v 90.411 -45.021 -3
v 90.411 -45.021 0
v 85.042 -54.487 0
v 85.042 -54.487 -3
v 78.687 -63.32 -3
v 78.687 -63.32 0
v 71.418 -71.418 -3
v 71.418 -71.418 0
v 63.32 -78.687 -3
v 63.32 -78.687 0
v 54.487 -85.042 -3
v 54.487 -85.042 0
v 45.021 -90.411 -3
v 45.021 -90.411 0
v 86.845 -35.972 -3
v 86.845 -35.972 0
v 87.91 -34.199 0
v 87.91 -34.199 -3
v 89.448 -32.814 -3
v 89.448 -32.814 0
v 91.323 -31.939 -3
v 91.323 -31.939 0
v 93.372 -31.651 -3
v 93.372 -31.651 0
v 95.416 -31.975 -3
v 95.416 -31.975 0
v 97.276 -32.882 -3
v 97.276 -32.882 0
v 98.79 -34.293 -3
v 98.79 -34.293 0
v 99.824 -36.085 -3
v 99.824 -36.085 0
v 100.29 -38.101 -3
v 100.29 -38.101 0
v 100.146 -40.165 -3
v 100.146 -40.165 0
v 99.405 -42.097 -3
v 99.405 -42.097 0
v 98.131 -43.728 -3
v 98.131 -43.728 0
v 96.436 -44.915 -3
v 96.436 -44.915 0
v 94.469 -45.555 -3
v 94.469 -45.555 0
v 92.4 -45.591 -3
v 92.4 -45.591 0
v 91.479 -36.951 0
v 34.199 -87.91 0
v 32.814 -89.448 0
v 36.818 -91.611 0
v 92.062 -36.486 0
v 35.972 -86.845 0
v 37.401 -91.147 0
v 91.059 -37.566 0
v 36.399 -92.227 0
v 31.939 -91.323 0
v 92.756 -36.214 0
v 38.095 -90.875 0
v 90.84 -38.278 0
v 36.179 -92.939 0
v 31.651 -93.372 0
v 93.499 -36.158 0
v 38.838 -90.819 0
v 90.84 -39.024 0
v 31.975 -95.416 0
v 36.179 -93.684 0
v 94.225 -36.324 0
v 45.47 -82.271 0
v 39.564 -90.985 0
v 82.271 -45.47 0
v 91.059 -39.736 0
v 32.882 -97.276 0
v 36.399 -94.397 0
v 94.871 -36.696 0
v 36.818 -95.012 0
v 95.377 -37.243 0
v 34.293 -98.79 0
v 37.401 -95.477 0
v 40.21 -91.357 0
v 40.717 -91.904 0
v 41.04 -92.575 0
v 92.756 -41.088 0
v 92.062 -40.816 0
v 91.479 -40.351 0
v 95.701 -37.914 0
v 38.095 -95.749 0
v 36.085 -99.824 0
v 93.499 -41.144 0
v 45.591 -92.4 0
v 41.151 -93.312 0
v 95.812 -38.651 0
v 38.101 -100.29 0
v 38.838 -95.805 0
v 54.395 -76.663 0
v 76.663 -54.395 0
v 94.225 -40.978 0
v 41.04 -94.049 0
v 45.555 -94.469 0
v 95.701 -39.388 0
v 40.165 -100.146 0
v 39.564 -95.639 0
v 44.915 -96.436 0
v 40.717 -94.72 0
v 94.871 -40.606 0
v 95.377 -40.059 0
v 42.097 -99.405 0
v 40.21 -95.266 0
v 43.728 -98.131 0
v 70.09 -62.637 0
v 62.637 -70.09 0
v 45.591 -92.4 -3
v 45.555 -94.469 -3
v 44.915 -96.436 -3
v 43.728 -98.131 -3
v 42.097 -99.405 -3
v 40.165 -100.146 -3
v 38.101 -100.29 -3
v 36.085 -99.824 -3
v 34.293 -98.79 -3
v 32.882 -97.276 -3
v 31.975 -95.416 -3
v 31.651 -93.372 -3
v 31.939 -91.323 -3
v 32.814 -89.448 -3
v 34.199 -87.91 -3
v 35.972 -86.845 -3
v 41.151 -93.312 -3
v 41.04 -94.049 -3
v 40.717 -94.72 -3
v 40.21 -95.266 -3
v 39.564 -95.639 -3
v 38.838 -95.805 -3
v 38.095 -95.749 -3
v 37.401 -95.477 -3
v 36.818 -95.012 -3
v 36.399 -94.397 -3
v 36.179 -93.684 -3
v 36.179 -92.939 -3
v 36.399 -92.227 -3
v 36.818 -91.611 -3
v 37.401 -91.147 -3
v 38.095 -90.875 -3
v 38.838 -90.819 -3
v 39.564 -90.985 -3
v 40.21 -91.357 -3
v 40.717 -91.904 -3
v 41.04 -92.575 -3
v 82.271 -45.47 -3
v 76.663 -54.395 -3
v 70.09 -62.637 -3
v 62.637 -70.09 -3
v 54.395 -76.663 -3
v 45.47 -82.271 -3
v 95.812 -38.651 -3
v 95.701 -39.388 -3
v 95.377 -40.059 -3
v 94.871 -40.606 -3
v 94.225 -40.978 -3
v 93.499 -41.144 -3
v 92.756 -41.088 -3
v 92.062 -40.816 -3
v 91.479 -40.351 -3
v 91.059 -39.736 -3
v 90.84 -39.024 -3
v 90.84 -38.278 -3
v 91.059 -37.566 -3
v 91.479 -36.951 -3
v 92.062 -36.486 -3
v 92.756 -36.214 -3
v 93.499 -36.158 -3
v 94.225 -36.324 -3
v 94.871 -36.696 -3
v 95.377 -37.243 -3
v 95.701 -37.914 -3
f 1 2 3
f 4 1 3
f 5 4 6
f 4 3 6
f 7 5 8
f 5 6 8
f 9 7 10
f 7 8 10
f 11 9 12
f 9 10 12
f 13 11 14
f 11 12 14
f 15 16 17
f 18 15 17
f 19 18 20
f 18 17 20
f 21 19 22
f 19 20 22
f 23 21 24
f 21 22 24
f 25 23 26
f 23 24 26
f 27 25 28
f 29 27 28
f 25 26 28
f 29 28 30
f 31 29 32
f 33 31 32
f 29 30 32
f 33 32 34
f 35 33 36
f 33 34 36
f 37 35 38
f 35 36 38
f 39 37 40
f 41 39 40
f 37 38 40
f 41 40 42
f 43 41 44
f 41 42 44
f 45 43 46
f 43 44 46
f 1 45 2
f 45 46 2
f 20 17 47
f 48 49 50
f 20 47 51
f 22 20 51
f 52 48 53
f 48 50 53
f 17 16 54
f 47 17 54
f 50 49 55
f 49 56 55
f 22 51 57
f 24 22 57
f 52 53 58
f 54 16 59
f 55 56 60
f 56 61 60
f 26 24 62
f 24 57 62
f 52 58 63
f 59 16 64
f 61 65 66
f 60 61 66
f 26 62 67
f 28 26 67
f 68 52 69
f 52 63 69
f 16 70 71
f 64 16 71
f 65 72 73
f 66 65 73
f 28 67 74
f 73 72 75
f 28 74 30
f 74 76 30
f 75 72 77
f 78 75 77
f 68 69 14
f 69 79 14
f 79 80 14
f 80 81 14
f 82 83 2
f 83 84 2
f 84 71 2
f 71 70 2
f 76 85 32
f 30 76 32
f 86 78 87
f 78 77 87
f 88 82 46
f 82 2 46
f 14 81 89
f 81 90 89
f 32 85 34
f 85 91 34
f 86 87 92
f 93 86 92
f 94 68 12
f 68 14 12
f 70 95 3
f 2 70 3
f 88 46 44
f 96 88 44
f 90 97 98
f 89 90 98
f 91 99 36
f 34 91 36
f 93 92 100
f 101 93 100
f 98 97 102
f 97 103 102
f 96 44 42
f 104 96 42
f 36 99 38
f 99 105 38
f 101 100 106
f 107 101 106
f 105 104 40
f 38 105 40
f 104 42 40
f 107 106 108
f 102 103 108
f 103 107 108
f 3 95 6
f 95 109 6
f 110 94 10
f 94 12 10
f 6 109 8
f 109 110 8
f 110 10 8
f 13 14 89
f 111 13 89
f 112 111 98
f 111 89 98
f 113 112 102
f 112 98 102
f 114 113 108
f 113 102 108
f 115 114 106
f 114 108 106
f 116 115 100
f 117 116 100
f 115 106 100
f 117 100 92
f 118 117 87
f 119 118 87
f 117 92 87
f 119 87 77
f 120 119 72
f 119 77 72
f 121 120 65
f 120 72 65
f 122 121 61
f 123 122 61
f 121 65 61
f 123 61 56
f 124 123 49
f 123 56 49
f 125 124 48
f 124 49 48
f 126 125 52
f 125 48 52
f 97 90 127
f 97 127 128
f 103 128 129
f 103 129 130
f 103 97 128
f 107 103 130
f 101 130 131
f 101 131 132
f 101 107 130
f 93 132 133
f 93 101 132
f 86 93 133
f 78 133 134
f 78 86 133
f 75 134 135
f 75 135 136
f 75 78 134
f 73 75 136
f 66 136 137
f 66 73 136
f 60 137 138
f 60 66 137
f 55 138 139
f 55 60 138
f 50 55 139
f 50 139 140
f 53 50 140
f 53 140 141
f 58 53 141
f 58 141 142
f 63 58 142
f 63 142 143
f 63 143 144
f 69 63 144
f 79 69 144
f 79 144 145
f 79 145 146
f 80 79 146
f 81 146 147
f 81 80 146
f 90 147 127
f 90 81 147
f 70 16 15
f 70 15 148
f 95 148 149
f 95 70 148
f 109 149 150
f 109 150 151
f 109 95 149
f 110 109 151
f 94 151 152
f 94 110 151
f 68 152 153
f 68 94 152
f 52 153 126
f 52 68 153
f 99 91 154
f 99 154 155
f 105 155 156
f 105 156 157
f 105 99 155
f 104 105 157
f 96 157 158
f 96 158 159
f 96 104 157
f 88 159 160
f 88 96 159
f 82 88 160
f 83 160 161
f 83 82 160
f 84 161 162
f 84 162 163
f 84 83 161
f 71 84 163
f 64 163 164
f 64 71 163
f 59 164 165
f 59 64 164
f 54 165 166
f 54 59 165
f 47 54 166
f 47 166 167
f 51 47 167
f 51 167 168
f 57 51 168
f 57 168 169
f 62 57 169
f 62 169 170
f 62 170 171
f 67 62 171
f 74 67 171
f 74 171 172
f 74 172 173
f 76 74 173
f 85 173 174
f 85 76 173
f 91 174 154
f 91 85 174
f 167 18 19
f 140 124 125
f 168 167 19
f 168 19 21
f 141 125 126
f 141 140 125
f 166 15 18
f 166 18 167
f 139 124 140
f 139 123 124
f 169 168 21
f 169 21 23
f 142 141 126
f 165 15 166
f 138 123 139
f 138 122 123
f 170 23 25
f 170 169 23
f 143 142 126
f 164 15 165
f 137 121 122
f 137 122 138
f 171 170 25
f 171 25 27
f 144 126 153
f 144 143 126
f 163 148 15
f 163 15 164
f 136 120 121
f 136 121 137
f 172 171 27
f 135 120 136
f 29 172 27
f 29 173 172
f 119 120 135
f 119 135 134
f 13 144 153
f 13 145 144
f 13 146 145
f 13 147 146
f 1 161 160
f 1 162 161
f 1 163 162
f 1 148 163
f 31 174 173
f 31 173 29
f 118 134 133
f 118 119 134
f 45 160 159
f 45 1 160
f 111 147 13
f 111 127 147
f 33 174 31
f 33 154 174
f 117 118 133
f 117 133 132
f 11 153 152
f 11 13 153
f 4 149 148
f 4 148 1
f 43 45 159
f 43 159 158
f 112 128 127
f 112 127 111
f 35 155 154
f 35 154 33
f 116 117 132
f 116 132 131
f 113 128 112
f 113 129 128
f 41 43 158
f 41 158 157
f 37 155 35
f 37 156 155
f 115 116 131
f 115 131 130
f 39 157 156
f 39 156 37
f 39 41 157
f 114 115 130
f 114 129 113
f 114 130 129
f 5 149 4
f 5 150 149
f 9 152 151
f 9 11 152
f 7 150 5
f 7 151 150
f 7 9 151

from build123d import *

# Parameters (mm, degrees)
SKETCH001_R = 2.5
PAD_DEPTH   = 3


with BuildPart() as part:
    # Sketch001 → Pad (new body)
    with BuildSketch(Plane(origin=(0, 0, 0), x_dir=(1, 0, 0), z_dir=(0, 0, -1))):
        with BuildLine():
            ThreePointArc((45.02147, 90.410548), (36.084716, 99.82444), (35.972243, 86.844676))
            ThreePointArc((86.844676, 35.972243), (66.468037, 66.468037), (35.972243, 86.844676))
            ThreePointArc((86.844676, 35.972243), (99.82444, 36.084716), (90.410548, 45.02147))
            ThreePointArc((90.410548, 45.02147), (71.417785, 71.417785), (45.02147, 90.410548))
        make_face()
        with Locations((38.651027, 93.311833)):
            Circle(SKETCH001_R, mode=Mode.SUBTRACT)
        with Locations((93.311833, 38.651027)):
            Circle(SKETCH001_R, mode=Mode.SUBTRACT)
    extrude(amount=PAD_DEPTH)


solid = part.part
